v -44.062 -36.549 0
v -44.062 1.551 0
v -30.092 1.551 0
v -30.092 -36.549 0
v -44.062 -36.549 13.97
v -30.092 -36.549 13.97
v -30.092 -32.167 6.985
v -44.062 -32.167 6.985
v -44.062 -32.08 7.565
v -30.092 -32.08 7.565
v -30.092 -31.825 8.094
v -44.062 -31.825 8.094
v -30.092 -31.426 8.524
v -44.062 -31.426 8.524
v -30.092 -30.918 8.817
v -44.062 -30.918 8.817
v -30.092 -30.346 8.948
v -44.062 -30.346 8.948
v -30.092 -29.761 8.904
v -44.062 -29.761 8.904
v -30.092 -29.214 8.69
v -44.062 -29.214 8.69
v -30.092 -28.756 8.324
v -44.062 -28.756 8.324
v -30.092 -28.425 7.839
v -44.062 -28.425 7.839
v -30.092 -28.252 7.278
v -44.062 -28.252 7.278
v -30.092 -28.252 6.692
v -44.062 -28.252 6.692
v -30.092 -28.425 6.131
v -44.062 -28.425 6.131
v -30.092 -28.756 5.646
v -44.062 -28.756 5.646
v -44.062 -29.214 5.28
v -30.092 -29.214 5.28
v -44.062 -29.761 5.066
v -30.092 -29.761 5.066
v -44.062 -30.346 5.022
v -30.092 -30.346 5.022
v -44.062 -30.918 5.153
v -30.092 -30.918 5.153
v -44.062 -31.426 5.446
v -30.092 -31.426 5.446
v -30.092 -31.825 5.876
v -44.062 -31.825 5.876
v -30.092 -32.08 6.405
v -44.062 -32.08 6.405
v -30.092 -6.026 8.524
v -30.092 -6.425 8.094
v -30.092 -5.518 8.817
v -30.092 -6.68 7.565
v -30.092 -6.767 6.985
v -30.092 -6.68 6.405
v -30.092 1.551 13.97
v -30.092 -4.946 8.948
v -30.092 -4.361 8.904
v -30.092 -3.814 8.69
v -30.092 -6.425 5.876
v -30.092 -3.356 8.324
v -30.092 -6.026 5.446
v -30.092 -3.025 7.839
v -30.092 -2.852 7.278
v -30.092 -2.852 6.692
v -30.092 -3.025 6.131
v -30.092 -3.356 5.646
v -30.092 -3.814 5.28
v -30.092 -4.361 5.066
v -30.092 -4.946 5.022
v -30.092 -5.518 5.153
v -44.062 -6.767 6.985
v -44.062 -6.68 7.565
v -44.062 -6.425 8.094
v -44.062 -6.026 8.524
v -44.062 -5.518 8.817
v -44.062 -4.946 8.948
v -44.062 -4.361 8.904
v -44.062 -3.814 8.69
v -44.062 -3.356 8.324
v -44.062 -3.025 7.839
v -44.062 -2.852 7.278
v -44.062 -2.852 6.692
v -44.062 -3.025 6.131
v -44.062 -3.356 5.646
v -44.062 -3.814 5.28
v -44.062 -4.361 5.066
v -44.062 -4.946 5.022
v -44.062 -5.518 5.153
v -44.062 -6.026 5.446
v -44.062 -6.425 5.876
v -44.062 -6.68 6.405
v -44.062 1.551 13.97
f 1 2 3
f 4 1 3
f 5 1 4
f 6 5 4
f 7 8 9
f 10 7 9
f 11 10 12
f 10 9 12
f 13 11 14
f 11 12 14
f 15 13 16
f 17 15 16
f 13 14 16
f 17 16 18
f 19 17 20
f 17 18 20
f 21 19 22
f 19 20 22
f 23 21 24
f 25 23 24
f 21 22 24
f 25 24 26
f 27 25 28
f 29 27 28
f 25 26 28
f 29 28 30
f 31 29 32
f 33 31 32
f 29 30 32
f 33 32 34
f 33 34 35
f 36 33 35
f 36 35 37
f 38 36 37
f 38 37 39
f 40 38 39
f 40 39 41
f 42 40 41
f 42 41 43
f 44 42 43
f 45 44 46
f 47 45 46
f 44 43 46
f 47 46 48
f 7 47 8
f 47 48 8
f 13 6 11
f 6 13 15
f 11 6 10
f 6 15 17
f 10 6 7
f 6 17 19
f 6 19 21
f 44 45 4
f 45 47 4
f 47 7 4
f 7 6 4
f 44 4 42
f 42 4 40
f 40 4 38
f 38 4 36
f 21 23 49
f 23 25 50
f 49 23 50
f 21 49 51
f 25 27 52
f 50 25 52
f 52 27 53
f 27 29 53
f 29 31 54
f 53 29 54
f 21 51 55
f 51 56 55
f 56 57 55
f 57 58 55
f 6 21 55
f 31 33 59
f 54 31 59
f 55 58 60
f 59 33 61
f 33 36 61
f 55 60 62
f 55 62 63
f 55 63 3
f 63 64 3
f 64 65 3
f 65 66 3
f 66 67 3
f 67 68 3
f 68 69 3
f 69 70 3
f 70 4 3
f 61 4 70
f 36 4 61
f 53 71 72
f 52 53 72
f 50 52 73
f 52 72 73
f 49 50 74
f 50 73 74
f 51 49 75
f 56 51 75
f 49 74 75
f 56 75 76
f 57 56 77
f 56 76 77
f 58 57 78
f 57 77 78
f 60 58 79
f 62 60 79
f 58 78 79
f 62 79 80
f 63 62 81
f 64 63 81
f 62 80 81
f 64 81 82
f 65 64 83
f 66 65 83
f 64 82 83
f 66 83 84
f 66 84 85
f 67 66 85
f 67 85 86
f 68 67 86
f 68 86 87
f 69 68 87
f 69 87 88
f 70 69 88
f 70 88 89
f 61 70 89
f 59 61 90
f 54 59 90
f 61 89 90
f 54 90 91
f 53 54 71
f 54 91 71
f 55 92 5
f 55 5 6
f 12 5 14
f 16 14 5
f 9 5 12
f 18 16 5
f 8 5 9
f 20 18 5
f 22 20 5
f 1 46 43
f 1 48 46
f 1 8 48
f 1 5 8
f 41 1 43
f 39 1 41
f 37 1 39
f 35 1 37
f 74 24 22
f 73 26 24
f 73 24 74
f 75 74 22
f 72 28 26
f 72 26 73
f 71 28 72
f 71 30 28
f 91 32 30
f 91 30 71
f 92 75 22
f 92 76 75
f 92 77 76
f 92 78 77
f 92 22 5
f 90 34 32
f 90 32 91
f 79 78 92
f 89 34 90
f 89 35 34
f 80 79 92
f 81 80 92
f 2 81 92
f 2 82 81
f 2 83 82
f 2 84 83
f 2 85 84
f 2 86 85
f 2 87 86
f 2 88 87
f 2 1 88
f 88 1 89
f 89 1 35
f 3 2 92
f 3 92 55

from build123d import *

# Parameters (mm, degrees)
SKETCH1_W           = 13.97
SKETCH1_H           = 38.1
BOSS_EXTRUDE1_DEPTH = 13.97
SKETCH2_R           = 1.9685
CUT_EXTRUDE2_DEPTH  = 13.97


with BuildPart() as part:
    # Sketch1 → Boss-Extrude1 (new body)
    with BuildSketch(Plane.XY):
        with Locations((-37.077191011, -17.498671499)):
            Rectangle(SKETCH1_W, SKETCH1_H)
    extrude(amount=BOSS_EXTRUDE1_DEPTH)

    # Sketch2 → Cut-Extrude2 (cut)
    with BuildSketch(Plane.ZY.offset(44.062191011)):
        with Locations((6.985, -4.798671499)):
            Circle(SKETCH2_R)
        with Locations((6.985, -30.198671499)):
            Circle(SKETCH2_R)
    extrude(amount=-CUT_EXTRUDE2_DEPTH, mode=Mode.SUBTRACT)


solid = part.part
